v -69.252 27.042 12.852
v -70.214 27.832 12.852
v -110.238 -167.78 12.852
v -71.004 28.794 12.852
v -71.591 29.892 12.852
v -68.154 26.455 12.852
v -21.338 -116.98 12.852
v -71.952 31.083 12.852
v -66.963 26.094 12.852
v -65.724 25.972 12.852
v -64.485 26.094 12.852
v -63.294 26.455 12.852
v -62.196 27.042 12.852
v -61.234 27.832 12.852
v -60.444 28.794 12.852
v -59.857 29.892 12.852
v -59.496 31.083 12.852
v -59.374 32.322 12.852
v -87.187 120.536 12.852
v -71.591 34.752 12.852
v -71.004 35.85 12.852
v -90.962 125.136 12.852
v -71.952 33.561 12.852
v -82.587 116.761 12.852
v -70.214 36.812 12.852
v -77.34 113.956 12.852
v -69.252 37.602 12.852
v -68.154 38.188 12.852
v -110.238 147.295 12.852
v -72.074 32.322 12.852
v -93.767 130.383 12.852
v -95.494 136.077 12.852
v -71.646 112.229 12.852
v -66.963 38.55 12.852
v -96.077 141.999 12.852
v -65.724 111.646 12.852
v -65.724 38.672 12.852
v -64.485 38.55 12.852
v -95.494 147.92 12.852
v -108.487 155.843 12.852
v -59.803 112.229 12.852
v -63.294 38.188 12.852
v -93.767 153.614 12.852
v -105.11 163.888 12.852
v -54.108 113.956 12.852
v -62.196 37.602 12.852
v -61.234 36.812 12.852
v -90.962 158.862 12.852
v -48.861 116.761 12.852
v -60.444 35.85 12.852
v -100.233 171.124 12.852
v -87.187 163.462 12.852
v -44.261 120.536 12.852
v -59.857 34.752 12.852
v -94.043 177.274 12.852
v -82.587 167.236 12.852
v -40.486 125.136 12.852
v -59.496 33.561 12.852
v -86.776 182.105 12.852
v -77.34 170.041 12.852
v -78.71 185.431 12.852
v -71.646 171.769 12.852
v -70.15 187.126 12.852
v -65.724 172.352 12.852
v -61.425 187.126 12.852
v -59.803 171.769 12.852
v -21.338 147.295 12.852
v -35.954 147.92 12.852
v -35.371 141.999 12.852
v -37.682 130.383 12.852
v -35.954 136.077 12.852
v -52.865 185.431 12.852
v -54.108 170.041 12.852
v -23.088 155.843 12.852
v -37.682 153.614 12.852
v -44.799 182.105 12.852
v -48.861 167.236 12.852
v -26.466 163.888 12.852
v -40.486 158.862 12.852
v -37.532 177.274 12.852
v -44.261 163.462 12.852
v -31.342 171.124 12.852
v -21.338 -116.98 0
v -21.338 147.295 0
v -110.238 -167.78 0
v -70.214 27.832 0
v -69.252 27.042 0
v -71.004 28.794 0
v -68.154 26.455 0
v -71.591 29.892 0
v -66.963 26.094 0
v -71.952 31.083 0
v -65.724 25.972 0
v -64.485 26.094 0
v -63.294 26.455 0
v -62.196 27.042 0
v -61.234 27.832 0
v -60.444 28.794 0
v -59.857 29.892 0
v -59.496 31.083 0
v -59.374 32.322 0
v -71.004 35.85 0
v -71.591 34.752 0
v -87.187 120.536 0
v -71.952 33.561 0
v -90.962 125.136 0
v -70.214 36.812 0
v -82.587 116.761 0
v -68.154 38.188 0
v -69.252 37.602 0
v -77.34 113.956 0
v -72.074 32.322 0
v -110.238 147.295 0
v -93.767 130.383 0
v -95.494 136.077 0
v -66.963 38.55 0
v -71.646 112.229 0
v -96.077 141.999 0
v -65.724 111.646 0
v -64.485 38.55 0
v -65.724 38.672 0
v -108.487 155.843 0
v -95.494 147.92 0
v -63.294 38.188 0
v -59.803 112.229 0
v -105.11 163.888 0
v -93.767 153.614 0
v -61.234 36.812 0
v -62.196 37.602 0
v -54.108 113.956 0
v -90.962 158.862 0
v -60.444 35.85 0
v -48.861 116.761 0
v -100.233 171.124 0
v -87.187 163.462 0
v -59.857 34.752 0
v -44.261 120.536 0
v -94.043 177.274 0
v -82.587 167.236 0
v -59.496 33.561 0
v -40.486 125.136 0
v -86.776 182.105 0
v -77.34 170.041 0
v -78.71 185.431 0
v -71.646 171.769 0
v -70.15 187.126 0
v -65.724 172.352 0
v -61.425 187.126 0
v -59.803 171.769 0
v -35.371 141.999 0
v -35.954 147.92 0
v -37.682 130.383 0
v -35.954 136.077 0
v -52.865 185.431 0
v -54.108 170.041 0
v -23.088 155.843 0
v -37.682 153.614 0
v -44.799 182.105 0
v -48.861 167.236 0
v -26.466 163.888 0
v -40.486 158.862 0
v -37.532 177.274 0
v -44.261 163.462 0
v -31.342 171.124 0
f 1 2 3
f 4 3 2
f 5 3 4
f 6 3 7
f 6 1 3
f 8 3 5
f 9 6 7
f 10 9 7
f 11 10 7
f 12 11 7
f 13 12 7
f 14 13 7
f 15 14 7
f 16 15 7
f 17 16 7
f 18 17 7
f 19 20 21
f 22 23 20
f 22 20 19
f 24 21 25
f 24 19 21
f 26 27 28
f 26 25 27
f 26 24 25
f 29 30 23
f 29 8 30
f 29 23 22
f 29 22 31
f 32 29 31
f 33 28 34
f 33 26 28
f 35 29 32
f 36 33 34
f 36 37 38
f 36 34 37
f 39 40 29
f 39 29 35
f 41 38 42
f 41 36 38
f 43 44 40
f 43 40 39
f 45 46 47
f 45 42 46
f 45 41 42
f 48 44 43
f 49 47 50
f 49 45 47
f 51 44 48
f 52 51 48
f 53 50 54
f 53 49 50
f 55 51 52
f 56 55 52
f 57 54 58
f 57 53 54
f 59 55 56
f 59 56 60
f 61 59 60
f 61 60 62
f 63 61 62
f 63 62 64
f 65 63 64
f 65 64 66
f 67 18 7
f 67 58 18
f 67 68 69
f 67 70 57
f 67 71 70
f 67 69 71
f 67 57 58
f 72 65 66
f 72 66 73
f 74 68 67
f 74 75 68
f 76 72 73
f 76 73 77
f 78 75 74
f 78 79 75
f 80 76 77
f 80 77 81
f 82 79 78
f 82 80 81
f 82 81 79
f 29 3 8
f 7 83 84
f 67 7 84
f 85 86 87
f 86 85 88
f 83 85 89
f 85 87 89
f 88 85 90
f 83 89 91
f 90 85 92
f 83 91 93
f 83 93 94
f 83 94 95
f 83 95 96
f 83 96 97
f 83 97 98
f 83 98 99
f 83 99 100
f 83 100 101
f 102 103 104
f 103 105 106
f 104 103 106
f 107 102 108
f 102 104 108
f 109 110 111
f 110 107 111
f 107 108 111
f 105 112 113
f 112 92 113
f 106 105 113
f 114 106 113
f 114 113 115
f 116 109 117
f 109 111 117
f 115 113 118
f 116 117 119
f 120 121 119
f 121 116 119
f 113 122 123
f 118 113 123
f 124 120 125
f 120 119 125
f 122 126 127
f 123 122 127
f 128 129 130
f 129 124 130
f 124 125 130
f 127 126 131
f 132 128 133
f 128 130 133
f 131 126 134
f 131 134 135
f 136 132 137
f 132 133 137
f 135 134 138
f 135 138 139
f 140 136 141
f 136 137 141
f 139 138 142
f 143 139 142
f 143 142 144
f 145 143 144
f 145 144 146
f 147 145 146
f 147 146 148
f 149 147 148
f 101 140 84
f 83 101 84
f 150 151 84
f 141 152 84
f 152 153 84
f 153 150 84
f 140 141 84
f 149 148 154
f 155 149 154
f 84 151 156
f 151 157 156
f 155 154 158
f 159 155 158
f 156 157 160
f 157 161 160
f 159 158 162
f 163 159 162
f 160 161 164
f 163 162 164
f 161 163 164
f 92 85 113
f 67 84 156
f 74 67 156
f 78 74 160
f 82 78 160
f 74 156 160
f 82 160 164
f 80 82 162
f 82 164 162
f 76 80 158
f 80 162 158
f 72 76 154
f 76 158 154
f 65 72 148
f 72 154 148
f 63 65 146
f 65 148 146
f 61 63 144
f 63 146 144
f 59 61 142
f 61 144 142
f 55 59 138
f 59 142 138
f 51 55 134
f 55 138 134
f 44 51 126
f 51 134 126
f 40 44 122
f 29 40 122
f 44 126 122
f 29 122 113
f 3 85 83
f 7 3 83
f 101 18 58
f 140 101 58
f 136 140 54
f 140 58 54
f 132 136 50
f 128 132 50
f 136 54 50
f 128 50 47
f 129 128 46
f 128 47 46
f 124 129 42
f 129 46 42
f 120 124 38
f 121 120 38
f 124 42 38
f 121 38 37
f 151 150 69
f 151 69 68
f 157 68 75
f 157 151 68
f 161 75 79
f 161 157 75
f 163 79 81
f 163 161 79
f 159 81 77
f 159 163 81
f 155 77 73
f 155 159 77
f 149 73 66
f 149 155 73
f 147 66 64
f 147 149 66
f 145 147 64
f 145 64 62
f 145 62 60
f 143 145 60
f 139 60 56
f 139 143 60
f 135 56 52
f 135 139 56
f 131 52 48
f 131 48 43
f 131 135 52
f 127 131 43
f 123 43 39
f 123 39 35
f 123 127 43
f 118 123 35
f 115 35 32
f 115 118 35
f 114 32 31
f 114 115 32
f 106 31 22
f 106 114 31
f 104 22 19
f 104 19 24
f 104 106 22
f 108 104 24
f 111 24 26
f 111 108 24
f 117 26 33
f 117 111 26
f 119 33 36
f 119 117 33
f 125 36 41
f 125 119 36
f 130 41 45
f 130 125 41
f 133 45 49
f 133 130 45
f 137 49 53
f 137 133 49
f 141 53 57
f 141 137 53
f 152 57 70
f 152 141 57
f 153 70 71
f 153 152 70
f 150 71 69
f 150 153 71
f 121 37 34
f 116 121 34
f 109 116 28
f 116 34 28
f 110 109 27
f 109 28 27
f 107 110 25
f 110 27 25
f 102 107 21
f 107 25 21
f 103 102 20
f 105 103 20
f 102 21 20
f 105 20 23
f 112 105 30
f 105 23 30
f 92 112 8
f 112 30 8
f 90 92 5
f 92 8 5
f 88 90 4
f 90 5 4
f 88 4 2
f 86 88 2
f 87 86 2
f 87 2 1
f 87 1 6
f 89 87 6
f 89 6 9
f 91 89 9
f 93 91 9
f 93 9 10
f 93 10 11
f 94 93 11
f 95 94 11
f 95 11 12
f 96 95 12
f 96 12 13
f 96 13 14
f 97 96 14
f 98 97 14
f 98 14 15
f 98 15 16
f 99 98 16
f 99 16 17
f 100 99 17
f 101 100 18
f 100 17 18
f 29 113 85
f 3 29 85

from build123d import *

# Parameters (mm, degrees)
F4_R     = 30.353
F6_DEPTH = 12.8524
F8_DEPTH = 25.4


with BuildPart() as f6:
    # F4 (on face) → F6 (new body)
    with BuildSketch(Plane.XY):
        with BuildLine():
            Line((-21.337585, -116.979506), (-21.337585, 147.294909))
            ThreePointArc((-21.337585, 147.294909), (-65.787585, 187.33966), (-110.237585, 147.294909))
            Line((-110.237585, 147.294909), (-110.237585, -167.779506))
            Line((-110.237585, -167.779506), (-21.337585, -116.979506))
        make_face()
        with Locations((-65.724085, 141.998894)):
            Circle(F4_R, mode=Mode.SUBTRACT)
    extrude(amount=F6_DEPTH)

    # F7 (on face) → F8 (cut)
    with BuildSketch(Plane.XY.offset(12.8524)):
        with BuildLine():
            ThreePointArc((-59.374085, 32.321694), (-61.233957, 36.811823), (-65.724085, 38.671694))
            ThreePointArc((-65.724085, 38.671694), (-70.214213, 27.831566), (-59.374085, 32.321694))
        make_face()
    extrude(amount=-F8_DEPTH, mode=Mode.SUBTRACT)


solid = f6.part
